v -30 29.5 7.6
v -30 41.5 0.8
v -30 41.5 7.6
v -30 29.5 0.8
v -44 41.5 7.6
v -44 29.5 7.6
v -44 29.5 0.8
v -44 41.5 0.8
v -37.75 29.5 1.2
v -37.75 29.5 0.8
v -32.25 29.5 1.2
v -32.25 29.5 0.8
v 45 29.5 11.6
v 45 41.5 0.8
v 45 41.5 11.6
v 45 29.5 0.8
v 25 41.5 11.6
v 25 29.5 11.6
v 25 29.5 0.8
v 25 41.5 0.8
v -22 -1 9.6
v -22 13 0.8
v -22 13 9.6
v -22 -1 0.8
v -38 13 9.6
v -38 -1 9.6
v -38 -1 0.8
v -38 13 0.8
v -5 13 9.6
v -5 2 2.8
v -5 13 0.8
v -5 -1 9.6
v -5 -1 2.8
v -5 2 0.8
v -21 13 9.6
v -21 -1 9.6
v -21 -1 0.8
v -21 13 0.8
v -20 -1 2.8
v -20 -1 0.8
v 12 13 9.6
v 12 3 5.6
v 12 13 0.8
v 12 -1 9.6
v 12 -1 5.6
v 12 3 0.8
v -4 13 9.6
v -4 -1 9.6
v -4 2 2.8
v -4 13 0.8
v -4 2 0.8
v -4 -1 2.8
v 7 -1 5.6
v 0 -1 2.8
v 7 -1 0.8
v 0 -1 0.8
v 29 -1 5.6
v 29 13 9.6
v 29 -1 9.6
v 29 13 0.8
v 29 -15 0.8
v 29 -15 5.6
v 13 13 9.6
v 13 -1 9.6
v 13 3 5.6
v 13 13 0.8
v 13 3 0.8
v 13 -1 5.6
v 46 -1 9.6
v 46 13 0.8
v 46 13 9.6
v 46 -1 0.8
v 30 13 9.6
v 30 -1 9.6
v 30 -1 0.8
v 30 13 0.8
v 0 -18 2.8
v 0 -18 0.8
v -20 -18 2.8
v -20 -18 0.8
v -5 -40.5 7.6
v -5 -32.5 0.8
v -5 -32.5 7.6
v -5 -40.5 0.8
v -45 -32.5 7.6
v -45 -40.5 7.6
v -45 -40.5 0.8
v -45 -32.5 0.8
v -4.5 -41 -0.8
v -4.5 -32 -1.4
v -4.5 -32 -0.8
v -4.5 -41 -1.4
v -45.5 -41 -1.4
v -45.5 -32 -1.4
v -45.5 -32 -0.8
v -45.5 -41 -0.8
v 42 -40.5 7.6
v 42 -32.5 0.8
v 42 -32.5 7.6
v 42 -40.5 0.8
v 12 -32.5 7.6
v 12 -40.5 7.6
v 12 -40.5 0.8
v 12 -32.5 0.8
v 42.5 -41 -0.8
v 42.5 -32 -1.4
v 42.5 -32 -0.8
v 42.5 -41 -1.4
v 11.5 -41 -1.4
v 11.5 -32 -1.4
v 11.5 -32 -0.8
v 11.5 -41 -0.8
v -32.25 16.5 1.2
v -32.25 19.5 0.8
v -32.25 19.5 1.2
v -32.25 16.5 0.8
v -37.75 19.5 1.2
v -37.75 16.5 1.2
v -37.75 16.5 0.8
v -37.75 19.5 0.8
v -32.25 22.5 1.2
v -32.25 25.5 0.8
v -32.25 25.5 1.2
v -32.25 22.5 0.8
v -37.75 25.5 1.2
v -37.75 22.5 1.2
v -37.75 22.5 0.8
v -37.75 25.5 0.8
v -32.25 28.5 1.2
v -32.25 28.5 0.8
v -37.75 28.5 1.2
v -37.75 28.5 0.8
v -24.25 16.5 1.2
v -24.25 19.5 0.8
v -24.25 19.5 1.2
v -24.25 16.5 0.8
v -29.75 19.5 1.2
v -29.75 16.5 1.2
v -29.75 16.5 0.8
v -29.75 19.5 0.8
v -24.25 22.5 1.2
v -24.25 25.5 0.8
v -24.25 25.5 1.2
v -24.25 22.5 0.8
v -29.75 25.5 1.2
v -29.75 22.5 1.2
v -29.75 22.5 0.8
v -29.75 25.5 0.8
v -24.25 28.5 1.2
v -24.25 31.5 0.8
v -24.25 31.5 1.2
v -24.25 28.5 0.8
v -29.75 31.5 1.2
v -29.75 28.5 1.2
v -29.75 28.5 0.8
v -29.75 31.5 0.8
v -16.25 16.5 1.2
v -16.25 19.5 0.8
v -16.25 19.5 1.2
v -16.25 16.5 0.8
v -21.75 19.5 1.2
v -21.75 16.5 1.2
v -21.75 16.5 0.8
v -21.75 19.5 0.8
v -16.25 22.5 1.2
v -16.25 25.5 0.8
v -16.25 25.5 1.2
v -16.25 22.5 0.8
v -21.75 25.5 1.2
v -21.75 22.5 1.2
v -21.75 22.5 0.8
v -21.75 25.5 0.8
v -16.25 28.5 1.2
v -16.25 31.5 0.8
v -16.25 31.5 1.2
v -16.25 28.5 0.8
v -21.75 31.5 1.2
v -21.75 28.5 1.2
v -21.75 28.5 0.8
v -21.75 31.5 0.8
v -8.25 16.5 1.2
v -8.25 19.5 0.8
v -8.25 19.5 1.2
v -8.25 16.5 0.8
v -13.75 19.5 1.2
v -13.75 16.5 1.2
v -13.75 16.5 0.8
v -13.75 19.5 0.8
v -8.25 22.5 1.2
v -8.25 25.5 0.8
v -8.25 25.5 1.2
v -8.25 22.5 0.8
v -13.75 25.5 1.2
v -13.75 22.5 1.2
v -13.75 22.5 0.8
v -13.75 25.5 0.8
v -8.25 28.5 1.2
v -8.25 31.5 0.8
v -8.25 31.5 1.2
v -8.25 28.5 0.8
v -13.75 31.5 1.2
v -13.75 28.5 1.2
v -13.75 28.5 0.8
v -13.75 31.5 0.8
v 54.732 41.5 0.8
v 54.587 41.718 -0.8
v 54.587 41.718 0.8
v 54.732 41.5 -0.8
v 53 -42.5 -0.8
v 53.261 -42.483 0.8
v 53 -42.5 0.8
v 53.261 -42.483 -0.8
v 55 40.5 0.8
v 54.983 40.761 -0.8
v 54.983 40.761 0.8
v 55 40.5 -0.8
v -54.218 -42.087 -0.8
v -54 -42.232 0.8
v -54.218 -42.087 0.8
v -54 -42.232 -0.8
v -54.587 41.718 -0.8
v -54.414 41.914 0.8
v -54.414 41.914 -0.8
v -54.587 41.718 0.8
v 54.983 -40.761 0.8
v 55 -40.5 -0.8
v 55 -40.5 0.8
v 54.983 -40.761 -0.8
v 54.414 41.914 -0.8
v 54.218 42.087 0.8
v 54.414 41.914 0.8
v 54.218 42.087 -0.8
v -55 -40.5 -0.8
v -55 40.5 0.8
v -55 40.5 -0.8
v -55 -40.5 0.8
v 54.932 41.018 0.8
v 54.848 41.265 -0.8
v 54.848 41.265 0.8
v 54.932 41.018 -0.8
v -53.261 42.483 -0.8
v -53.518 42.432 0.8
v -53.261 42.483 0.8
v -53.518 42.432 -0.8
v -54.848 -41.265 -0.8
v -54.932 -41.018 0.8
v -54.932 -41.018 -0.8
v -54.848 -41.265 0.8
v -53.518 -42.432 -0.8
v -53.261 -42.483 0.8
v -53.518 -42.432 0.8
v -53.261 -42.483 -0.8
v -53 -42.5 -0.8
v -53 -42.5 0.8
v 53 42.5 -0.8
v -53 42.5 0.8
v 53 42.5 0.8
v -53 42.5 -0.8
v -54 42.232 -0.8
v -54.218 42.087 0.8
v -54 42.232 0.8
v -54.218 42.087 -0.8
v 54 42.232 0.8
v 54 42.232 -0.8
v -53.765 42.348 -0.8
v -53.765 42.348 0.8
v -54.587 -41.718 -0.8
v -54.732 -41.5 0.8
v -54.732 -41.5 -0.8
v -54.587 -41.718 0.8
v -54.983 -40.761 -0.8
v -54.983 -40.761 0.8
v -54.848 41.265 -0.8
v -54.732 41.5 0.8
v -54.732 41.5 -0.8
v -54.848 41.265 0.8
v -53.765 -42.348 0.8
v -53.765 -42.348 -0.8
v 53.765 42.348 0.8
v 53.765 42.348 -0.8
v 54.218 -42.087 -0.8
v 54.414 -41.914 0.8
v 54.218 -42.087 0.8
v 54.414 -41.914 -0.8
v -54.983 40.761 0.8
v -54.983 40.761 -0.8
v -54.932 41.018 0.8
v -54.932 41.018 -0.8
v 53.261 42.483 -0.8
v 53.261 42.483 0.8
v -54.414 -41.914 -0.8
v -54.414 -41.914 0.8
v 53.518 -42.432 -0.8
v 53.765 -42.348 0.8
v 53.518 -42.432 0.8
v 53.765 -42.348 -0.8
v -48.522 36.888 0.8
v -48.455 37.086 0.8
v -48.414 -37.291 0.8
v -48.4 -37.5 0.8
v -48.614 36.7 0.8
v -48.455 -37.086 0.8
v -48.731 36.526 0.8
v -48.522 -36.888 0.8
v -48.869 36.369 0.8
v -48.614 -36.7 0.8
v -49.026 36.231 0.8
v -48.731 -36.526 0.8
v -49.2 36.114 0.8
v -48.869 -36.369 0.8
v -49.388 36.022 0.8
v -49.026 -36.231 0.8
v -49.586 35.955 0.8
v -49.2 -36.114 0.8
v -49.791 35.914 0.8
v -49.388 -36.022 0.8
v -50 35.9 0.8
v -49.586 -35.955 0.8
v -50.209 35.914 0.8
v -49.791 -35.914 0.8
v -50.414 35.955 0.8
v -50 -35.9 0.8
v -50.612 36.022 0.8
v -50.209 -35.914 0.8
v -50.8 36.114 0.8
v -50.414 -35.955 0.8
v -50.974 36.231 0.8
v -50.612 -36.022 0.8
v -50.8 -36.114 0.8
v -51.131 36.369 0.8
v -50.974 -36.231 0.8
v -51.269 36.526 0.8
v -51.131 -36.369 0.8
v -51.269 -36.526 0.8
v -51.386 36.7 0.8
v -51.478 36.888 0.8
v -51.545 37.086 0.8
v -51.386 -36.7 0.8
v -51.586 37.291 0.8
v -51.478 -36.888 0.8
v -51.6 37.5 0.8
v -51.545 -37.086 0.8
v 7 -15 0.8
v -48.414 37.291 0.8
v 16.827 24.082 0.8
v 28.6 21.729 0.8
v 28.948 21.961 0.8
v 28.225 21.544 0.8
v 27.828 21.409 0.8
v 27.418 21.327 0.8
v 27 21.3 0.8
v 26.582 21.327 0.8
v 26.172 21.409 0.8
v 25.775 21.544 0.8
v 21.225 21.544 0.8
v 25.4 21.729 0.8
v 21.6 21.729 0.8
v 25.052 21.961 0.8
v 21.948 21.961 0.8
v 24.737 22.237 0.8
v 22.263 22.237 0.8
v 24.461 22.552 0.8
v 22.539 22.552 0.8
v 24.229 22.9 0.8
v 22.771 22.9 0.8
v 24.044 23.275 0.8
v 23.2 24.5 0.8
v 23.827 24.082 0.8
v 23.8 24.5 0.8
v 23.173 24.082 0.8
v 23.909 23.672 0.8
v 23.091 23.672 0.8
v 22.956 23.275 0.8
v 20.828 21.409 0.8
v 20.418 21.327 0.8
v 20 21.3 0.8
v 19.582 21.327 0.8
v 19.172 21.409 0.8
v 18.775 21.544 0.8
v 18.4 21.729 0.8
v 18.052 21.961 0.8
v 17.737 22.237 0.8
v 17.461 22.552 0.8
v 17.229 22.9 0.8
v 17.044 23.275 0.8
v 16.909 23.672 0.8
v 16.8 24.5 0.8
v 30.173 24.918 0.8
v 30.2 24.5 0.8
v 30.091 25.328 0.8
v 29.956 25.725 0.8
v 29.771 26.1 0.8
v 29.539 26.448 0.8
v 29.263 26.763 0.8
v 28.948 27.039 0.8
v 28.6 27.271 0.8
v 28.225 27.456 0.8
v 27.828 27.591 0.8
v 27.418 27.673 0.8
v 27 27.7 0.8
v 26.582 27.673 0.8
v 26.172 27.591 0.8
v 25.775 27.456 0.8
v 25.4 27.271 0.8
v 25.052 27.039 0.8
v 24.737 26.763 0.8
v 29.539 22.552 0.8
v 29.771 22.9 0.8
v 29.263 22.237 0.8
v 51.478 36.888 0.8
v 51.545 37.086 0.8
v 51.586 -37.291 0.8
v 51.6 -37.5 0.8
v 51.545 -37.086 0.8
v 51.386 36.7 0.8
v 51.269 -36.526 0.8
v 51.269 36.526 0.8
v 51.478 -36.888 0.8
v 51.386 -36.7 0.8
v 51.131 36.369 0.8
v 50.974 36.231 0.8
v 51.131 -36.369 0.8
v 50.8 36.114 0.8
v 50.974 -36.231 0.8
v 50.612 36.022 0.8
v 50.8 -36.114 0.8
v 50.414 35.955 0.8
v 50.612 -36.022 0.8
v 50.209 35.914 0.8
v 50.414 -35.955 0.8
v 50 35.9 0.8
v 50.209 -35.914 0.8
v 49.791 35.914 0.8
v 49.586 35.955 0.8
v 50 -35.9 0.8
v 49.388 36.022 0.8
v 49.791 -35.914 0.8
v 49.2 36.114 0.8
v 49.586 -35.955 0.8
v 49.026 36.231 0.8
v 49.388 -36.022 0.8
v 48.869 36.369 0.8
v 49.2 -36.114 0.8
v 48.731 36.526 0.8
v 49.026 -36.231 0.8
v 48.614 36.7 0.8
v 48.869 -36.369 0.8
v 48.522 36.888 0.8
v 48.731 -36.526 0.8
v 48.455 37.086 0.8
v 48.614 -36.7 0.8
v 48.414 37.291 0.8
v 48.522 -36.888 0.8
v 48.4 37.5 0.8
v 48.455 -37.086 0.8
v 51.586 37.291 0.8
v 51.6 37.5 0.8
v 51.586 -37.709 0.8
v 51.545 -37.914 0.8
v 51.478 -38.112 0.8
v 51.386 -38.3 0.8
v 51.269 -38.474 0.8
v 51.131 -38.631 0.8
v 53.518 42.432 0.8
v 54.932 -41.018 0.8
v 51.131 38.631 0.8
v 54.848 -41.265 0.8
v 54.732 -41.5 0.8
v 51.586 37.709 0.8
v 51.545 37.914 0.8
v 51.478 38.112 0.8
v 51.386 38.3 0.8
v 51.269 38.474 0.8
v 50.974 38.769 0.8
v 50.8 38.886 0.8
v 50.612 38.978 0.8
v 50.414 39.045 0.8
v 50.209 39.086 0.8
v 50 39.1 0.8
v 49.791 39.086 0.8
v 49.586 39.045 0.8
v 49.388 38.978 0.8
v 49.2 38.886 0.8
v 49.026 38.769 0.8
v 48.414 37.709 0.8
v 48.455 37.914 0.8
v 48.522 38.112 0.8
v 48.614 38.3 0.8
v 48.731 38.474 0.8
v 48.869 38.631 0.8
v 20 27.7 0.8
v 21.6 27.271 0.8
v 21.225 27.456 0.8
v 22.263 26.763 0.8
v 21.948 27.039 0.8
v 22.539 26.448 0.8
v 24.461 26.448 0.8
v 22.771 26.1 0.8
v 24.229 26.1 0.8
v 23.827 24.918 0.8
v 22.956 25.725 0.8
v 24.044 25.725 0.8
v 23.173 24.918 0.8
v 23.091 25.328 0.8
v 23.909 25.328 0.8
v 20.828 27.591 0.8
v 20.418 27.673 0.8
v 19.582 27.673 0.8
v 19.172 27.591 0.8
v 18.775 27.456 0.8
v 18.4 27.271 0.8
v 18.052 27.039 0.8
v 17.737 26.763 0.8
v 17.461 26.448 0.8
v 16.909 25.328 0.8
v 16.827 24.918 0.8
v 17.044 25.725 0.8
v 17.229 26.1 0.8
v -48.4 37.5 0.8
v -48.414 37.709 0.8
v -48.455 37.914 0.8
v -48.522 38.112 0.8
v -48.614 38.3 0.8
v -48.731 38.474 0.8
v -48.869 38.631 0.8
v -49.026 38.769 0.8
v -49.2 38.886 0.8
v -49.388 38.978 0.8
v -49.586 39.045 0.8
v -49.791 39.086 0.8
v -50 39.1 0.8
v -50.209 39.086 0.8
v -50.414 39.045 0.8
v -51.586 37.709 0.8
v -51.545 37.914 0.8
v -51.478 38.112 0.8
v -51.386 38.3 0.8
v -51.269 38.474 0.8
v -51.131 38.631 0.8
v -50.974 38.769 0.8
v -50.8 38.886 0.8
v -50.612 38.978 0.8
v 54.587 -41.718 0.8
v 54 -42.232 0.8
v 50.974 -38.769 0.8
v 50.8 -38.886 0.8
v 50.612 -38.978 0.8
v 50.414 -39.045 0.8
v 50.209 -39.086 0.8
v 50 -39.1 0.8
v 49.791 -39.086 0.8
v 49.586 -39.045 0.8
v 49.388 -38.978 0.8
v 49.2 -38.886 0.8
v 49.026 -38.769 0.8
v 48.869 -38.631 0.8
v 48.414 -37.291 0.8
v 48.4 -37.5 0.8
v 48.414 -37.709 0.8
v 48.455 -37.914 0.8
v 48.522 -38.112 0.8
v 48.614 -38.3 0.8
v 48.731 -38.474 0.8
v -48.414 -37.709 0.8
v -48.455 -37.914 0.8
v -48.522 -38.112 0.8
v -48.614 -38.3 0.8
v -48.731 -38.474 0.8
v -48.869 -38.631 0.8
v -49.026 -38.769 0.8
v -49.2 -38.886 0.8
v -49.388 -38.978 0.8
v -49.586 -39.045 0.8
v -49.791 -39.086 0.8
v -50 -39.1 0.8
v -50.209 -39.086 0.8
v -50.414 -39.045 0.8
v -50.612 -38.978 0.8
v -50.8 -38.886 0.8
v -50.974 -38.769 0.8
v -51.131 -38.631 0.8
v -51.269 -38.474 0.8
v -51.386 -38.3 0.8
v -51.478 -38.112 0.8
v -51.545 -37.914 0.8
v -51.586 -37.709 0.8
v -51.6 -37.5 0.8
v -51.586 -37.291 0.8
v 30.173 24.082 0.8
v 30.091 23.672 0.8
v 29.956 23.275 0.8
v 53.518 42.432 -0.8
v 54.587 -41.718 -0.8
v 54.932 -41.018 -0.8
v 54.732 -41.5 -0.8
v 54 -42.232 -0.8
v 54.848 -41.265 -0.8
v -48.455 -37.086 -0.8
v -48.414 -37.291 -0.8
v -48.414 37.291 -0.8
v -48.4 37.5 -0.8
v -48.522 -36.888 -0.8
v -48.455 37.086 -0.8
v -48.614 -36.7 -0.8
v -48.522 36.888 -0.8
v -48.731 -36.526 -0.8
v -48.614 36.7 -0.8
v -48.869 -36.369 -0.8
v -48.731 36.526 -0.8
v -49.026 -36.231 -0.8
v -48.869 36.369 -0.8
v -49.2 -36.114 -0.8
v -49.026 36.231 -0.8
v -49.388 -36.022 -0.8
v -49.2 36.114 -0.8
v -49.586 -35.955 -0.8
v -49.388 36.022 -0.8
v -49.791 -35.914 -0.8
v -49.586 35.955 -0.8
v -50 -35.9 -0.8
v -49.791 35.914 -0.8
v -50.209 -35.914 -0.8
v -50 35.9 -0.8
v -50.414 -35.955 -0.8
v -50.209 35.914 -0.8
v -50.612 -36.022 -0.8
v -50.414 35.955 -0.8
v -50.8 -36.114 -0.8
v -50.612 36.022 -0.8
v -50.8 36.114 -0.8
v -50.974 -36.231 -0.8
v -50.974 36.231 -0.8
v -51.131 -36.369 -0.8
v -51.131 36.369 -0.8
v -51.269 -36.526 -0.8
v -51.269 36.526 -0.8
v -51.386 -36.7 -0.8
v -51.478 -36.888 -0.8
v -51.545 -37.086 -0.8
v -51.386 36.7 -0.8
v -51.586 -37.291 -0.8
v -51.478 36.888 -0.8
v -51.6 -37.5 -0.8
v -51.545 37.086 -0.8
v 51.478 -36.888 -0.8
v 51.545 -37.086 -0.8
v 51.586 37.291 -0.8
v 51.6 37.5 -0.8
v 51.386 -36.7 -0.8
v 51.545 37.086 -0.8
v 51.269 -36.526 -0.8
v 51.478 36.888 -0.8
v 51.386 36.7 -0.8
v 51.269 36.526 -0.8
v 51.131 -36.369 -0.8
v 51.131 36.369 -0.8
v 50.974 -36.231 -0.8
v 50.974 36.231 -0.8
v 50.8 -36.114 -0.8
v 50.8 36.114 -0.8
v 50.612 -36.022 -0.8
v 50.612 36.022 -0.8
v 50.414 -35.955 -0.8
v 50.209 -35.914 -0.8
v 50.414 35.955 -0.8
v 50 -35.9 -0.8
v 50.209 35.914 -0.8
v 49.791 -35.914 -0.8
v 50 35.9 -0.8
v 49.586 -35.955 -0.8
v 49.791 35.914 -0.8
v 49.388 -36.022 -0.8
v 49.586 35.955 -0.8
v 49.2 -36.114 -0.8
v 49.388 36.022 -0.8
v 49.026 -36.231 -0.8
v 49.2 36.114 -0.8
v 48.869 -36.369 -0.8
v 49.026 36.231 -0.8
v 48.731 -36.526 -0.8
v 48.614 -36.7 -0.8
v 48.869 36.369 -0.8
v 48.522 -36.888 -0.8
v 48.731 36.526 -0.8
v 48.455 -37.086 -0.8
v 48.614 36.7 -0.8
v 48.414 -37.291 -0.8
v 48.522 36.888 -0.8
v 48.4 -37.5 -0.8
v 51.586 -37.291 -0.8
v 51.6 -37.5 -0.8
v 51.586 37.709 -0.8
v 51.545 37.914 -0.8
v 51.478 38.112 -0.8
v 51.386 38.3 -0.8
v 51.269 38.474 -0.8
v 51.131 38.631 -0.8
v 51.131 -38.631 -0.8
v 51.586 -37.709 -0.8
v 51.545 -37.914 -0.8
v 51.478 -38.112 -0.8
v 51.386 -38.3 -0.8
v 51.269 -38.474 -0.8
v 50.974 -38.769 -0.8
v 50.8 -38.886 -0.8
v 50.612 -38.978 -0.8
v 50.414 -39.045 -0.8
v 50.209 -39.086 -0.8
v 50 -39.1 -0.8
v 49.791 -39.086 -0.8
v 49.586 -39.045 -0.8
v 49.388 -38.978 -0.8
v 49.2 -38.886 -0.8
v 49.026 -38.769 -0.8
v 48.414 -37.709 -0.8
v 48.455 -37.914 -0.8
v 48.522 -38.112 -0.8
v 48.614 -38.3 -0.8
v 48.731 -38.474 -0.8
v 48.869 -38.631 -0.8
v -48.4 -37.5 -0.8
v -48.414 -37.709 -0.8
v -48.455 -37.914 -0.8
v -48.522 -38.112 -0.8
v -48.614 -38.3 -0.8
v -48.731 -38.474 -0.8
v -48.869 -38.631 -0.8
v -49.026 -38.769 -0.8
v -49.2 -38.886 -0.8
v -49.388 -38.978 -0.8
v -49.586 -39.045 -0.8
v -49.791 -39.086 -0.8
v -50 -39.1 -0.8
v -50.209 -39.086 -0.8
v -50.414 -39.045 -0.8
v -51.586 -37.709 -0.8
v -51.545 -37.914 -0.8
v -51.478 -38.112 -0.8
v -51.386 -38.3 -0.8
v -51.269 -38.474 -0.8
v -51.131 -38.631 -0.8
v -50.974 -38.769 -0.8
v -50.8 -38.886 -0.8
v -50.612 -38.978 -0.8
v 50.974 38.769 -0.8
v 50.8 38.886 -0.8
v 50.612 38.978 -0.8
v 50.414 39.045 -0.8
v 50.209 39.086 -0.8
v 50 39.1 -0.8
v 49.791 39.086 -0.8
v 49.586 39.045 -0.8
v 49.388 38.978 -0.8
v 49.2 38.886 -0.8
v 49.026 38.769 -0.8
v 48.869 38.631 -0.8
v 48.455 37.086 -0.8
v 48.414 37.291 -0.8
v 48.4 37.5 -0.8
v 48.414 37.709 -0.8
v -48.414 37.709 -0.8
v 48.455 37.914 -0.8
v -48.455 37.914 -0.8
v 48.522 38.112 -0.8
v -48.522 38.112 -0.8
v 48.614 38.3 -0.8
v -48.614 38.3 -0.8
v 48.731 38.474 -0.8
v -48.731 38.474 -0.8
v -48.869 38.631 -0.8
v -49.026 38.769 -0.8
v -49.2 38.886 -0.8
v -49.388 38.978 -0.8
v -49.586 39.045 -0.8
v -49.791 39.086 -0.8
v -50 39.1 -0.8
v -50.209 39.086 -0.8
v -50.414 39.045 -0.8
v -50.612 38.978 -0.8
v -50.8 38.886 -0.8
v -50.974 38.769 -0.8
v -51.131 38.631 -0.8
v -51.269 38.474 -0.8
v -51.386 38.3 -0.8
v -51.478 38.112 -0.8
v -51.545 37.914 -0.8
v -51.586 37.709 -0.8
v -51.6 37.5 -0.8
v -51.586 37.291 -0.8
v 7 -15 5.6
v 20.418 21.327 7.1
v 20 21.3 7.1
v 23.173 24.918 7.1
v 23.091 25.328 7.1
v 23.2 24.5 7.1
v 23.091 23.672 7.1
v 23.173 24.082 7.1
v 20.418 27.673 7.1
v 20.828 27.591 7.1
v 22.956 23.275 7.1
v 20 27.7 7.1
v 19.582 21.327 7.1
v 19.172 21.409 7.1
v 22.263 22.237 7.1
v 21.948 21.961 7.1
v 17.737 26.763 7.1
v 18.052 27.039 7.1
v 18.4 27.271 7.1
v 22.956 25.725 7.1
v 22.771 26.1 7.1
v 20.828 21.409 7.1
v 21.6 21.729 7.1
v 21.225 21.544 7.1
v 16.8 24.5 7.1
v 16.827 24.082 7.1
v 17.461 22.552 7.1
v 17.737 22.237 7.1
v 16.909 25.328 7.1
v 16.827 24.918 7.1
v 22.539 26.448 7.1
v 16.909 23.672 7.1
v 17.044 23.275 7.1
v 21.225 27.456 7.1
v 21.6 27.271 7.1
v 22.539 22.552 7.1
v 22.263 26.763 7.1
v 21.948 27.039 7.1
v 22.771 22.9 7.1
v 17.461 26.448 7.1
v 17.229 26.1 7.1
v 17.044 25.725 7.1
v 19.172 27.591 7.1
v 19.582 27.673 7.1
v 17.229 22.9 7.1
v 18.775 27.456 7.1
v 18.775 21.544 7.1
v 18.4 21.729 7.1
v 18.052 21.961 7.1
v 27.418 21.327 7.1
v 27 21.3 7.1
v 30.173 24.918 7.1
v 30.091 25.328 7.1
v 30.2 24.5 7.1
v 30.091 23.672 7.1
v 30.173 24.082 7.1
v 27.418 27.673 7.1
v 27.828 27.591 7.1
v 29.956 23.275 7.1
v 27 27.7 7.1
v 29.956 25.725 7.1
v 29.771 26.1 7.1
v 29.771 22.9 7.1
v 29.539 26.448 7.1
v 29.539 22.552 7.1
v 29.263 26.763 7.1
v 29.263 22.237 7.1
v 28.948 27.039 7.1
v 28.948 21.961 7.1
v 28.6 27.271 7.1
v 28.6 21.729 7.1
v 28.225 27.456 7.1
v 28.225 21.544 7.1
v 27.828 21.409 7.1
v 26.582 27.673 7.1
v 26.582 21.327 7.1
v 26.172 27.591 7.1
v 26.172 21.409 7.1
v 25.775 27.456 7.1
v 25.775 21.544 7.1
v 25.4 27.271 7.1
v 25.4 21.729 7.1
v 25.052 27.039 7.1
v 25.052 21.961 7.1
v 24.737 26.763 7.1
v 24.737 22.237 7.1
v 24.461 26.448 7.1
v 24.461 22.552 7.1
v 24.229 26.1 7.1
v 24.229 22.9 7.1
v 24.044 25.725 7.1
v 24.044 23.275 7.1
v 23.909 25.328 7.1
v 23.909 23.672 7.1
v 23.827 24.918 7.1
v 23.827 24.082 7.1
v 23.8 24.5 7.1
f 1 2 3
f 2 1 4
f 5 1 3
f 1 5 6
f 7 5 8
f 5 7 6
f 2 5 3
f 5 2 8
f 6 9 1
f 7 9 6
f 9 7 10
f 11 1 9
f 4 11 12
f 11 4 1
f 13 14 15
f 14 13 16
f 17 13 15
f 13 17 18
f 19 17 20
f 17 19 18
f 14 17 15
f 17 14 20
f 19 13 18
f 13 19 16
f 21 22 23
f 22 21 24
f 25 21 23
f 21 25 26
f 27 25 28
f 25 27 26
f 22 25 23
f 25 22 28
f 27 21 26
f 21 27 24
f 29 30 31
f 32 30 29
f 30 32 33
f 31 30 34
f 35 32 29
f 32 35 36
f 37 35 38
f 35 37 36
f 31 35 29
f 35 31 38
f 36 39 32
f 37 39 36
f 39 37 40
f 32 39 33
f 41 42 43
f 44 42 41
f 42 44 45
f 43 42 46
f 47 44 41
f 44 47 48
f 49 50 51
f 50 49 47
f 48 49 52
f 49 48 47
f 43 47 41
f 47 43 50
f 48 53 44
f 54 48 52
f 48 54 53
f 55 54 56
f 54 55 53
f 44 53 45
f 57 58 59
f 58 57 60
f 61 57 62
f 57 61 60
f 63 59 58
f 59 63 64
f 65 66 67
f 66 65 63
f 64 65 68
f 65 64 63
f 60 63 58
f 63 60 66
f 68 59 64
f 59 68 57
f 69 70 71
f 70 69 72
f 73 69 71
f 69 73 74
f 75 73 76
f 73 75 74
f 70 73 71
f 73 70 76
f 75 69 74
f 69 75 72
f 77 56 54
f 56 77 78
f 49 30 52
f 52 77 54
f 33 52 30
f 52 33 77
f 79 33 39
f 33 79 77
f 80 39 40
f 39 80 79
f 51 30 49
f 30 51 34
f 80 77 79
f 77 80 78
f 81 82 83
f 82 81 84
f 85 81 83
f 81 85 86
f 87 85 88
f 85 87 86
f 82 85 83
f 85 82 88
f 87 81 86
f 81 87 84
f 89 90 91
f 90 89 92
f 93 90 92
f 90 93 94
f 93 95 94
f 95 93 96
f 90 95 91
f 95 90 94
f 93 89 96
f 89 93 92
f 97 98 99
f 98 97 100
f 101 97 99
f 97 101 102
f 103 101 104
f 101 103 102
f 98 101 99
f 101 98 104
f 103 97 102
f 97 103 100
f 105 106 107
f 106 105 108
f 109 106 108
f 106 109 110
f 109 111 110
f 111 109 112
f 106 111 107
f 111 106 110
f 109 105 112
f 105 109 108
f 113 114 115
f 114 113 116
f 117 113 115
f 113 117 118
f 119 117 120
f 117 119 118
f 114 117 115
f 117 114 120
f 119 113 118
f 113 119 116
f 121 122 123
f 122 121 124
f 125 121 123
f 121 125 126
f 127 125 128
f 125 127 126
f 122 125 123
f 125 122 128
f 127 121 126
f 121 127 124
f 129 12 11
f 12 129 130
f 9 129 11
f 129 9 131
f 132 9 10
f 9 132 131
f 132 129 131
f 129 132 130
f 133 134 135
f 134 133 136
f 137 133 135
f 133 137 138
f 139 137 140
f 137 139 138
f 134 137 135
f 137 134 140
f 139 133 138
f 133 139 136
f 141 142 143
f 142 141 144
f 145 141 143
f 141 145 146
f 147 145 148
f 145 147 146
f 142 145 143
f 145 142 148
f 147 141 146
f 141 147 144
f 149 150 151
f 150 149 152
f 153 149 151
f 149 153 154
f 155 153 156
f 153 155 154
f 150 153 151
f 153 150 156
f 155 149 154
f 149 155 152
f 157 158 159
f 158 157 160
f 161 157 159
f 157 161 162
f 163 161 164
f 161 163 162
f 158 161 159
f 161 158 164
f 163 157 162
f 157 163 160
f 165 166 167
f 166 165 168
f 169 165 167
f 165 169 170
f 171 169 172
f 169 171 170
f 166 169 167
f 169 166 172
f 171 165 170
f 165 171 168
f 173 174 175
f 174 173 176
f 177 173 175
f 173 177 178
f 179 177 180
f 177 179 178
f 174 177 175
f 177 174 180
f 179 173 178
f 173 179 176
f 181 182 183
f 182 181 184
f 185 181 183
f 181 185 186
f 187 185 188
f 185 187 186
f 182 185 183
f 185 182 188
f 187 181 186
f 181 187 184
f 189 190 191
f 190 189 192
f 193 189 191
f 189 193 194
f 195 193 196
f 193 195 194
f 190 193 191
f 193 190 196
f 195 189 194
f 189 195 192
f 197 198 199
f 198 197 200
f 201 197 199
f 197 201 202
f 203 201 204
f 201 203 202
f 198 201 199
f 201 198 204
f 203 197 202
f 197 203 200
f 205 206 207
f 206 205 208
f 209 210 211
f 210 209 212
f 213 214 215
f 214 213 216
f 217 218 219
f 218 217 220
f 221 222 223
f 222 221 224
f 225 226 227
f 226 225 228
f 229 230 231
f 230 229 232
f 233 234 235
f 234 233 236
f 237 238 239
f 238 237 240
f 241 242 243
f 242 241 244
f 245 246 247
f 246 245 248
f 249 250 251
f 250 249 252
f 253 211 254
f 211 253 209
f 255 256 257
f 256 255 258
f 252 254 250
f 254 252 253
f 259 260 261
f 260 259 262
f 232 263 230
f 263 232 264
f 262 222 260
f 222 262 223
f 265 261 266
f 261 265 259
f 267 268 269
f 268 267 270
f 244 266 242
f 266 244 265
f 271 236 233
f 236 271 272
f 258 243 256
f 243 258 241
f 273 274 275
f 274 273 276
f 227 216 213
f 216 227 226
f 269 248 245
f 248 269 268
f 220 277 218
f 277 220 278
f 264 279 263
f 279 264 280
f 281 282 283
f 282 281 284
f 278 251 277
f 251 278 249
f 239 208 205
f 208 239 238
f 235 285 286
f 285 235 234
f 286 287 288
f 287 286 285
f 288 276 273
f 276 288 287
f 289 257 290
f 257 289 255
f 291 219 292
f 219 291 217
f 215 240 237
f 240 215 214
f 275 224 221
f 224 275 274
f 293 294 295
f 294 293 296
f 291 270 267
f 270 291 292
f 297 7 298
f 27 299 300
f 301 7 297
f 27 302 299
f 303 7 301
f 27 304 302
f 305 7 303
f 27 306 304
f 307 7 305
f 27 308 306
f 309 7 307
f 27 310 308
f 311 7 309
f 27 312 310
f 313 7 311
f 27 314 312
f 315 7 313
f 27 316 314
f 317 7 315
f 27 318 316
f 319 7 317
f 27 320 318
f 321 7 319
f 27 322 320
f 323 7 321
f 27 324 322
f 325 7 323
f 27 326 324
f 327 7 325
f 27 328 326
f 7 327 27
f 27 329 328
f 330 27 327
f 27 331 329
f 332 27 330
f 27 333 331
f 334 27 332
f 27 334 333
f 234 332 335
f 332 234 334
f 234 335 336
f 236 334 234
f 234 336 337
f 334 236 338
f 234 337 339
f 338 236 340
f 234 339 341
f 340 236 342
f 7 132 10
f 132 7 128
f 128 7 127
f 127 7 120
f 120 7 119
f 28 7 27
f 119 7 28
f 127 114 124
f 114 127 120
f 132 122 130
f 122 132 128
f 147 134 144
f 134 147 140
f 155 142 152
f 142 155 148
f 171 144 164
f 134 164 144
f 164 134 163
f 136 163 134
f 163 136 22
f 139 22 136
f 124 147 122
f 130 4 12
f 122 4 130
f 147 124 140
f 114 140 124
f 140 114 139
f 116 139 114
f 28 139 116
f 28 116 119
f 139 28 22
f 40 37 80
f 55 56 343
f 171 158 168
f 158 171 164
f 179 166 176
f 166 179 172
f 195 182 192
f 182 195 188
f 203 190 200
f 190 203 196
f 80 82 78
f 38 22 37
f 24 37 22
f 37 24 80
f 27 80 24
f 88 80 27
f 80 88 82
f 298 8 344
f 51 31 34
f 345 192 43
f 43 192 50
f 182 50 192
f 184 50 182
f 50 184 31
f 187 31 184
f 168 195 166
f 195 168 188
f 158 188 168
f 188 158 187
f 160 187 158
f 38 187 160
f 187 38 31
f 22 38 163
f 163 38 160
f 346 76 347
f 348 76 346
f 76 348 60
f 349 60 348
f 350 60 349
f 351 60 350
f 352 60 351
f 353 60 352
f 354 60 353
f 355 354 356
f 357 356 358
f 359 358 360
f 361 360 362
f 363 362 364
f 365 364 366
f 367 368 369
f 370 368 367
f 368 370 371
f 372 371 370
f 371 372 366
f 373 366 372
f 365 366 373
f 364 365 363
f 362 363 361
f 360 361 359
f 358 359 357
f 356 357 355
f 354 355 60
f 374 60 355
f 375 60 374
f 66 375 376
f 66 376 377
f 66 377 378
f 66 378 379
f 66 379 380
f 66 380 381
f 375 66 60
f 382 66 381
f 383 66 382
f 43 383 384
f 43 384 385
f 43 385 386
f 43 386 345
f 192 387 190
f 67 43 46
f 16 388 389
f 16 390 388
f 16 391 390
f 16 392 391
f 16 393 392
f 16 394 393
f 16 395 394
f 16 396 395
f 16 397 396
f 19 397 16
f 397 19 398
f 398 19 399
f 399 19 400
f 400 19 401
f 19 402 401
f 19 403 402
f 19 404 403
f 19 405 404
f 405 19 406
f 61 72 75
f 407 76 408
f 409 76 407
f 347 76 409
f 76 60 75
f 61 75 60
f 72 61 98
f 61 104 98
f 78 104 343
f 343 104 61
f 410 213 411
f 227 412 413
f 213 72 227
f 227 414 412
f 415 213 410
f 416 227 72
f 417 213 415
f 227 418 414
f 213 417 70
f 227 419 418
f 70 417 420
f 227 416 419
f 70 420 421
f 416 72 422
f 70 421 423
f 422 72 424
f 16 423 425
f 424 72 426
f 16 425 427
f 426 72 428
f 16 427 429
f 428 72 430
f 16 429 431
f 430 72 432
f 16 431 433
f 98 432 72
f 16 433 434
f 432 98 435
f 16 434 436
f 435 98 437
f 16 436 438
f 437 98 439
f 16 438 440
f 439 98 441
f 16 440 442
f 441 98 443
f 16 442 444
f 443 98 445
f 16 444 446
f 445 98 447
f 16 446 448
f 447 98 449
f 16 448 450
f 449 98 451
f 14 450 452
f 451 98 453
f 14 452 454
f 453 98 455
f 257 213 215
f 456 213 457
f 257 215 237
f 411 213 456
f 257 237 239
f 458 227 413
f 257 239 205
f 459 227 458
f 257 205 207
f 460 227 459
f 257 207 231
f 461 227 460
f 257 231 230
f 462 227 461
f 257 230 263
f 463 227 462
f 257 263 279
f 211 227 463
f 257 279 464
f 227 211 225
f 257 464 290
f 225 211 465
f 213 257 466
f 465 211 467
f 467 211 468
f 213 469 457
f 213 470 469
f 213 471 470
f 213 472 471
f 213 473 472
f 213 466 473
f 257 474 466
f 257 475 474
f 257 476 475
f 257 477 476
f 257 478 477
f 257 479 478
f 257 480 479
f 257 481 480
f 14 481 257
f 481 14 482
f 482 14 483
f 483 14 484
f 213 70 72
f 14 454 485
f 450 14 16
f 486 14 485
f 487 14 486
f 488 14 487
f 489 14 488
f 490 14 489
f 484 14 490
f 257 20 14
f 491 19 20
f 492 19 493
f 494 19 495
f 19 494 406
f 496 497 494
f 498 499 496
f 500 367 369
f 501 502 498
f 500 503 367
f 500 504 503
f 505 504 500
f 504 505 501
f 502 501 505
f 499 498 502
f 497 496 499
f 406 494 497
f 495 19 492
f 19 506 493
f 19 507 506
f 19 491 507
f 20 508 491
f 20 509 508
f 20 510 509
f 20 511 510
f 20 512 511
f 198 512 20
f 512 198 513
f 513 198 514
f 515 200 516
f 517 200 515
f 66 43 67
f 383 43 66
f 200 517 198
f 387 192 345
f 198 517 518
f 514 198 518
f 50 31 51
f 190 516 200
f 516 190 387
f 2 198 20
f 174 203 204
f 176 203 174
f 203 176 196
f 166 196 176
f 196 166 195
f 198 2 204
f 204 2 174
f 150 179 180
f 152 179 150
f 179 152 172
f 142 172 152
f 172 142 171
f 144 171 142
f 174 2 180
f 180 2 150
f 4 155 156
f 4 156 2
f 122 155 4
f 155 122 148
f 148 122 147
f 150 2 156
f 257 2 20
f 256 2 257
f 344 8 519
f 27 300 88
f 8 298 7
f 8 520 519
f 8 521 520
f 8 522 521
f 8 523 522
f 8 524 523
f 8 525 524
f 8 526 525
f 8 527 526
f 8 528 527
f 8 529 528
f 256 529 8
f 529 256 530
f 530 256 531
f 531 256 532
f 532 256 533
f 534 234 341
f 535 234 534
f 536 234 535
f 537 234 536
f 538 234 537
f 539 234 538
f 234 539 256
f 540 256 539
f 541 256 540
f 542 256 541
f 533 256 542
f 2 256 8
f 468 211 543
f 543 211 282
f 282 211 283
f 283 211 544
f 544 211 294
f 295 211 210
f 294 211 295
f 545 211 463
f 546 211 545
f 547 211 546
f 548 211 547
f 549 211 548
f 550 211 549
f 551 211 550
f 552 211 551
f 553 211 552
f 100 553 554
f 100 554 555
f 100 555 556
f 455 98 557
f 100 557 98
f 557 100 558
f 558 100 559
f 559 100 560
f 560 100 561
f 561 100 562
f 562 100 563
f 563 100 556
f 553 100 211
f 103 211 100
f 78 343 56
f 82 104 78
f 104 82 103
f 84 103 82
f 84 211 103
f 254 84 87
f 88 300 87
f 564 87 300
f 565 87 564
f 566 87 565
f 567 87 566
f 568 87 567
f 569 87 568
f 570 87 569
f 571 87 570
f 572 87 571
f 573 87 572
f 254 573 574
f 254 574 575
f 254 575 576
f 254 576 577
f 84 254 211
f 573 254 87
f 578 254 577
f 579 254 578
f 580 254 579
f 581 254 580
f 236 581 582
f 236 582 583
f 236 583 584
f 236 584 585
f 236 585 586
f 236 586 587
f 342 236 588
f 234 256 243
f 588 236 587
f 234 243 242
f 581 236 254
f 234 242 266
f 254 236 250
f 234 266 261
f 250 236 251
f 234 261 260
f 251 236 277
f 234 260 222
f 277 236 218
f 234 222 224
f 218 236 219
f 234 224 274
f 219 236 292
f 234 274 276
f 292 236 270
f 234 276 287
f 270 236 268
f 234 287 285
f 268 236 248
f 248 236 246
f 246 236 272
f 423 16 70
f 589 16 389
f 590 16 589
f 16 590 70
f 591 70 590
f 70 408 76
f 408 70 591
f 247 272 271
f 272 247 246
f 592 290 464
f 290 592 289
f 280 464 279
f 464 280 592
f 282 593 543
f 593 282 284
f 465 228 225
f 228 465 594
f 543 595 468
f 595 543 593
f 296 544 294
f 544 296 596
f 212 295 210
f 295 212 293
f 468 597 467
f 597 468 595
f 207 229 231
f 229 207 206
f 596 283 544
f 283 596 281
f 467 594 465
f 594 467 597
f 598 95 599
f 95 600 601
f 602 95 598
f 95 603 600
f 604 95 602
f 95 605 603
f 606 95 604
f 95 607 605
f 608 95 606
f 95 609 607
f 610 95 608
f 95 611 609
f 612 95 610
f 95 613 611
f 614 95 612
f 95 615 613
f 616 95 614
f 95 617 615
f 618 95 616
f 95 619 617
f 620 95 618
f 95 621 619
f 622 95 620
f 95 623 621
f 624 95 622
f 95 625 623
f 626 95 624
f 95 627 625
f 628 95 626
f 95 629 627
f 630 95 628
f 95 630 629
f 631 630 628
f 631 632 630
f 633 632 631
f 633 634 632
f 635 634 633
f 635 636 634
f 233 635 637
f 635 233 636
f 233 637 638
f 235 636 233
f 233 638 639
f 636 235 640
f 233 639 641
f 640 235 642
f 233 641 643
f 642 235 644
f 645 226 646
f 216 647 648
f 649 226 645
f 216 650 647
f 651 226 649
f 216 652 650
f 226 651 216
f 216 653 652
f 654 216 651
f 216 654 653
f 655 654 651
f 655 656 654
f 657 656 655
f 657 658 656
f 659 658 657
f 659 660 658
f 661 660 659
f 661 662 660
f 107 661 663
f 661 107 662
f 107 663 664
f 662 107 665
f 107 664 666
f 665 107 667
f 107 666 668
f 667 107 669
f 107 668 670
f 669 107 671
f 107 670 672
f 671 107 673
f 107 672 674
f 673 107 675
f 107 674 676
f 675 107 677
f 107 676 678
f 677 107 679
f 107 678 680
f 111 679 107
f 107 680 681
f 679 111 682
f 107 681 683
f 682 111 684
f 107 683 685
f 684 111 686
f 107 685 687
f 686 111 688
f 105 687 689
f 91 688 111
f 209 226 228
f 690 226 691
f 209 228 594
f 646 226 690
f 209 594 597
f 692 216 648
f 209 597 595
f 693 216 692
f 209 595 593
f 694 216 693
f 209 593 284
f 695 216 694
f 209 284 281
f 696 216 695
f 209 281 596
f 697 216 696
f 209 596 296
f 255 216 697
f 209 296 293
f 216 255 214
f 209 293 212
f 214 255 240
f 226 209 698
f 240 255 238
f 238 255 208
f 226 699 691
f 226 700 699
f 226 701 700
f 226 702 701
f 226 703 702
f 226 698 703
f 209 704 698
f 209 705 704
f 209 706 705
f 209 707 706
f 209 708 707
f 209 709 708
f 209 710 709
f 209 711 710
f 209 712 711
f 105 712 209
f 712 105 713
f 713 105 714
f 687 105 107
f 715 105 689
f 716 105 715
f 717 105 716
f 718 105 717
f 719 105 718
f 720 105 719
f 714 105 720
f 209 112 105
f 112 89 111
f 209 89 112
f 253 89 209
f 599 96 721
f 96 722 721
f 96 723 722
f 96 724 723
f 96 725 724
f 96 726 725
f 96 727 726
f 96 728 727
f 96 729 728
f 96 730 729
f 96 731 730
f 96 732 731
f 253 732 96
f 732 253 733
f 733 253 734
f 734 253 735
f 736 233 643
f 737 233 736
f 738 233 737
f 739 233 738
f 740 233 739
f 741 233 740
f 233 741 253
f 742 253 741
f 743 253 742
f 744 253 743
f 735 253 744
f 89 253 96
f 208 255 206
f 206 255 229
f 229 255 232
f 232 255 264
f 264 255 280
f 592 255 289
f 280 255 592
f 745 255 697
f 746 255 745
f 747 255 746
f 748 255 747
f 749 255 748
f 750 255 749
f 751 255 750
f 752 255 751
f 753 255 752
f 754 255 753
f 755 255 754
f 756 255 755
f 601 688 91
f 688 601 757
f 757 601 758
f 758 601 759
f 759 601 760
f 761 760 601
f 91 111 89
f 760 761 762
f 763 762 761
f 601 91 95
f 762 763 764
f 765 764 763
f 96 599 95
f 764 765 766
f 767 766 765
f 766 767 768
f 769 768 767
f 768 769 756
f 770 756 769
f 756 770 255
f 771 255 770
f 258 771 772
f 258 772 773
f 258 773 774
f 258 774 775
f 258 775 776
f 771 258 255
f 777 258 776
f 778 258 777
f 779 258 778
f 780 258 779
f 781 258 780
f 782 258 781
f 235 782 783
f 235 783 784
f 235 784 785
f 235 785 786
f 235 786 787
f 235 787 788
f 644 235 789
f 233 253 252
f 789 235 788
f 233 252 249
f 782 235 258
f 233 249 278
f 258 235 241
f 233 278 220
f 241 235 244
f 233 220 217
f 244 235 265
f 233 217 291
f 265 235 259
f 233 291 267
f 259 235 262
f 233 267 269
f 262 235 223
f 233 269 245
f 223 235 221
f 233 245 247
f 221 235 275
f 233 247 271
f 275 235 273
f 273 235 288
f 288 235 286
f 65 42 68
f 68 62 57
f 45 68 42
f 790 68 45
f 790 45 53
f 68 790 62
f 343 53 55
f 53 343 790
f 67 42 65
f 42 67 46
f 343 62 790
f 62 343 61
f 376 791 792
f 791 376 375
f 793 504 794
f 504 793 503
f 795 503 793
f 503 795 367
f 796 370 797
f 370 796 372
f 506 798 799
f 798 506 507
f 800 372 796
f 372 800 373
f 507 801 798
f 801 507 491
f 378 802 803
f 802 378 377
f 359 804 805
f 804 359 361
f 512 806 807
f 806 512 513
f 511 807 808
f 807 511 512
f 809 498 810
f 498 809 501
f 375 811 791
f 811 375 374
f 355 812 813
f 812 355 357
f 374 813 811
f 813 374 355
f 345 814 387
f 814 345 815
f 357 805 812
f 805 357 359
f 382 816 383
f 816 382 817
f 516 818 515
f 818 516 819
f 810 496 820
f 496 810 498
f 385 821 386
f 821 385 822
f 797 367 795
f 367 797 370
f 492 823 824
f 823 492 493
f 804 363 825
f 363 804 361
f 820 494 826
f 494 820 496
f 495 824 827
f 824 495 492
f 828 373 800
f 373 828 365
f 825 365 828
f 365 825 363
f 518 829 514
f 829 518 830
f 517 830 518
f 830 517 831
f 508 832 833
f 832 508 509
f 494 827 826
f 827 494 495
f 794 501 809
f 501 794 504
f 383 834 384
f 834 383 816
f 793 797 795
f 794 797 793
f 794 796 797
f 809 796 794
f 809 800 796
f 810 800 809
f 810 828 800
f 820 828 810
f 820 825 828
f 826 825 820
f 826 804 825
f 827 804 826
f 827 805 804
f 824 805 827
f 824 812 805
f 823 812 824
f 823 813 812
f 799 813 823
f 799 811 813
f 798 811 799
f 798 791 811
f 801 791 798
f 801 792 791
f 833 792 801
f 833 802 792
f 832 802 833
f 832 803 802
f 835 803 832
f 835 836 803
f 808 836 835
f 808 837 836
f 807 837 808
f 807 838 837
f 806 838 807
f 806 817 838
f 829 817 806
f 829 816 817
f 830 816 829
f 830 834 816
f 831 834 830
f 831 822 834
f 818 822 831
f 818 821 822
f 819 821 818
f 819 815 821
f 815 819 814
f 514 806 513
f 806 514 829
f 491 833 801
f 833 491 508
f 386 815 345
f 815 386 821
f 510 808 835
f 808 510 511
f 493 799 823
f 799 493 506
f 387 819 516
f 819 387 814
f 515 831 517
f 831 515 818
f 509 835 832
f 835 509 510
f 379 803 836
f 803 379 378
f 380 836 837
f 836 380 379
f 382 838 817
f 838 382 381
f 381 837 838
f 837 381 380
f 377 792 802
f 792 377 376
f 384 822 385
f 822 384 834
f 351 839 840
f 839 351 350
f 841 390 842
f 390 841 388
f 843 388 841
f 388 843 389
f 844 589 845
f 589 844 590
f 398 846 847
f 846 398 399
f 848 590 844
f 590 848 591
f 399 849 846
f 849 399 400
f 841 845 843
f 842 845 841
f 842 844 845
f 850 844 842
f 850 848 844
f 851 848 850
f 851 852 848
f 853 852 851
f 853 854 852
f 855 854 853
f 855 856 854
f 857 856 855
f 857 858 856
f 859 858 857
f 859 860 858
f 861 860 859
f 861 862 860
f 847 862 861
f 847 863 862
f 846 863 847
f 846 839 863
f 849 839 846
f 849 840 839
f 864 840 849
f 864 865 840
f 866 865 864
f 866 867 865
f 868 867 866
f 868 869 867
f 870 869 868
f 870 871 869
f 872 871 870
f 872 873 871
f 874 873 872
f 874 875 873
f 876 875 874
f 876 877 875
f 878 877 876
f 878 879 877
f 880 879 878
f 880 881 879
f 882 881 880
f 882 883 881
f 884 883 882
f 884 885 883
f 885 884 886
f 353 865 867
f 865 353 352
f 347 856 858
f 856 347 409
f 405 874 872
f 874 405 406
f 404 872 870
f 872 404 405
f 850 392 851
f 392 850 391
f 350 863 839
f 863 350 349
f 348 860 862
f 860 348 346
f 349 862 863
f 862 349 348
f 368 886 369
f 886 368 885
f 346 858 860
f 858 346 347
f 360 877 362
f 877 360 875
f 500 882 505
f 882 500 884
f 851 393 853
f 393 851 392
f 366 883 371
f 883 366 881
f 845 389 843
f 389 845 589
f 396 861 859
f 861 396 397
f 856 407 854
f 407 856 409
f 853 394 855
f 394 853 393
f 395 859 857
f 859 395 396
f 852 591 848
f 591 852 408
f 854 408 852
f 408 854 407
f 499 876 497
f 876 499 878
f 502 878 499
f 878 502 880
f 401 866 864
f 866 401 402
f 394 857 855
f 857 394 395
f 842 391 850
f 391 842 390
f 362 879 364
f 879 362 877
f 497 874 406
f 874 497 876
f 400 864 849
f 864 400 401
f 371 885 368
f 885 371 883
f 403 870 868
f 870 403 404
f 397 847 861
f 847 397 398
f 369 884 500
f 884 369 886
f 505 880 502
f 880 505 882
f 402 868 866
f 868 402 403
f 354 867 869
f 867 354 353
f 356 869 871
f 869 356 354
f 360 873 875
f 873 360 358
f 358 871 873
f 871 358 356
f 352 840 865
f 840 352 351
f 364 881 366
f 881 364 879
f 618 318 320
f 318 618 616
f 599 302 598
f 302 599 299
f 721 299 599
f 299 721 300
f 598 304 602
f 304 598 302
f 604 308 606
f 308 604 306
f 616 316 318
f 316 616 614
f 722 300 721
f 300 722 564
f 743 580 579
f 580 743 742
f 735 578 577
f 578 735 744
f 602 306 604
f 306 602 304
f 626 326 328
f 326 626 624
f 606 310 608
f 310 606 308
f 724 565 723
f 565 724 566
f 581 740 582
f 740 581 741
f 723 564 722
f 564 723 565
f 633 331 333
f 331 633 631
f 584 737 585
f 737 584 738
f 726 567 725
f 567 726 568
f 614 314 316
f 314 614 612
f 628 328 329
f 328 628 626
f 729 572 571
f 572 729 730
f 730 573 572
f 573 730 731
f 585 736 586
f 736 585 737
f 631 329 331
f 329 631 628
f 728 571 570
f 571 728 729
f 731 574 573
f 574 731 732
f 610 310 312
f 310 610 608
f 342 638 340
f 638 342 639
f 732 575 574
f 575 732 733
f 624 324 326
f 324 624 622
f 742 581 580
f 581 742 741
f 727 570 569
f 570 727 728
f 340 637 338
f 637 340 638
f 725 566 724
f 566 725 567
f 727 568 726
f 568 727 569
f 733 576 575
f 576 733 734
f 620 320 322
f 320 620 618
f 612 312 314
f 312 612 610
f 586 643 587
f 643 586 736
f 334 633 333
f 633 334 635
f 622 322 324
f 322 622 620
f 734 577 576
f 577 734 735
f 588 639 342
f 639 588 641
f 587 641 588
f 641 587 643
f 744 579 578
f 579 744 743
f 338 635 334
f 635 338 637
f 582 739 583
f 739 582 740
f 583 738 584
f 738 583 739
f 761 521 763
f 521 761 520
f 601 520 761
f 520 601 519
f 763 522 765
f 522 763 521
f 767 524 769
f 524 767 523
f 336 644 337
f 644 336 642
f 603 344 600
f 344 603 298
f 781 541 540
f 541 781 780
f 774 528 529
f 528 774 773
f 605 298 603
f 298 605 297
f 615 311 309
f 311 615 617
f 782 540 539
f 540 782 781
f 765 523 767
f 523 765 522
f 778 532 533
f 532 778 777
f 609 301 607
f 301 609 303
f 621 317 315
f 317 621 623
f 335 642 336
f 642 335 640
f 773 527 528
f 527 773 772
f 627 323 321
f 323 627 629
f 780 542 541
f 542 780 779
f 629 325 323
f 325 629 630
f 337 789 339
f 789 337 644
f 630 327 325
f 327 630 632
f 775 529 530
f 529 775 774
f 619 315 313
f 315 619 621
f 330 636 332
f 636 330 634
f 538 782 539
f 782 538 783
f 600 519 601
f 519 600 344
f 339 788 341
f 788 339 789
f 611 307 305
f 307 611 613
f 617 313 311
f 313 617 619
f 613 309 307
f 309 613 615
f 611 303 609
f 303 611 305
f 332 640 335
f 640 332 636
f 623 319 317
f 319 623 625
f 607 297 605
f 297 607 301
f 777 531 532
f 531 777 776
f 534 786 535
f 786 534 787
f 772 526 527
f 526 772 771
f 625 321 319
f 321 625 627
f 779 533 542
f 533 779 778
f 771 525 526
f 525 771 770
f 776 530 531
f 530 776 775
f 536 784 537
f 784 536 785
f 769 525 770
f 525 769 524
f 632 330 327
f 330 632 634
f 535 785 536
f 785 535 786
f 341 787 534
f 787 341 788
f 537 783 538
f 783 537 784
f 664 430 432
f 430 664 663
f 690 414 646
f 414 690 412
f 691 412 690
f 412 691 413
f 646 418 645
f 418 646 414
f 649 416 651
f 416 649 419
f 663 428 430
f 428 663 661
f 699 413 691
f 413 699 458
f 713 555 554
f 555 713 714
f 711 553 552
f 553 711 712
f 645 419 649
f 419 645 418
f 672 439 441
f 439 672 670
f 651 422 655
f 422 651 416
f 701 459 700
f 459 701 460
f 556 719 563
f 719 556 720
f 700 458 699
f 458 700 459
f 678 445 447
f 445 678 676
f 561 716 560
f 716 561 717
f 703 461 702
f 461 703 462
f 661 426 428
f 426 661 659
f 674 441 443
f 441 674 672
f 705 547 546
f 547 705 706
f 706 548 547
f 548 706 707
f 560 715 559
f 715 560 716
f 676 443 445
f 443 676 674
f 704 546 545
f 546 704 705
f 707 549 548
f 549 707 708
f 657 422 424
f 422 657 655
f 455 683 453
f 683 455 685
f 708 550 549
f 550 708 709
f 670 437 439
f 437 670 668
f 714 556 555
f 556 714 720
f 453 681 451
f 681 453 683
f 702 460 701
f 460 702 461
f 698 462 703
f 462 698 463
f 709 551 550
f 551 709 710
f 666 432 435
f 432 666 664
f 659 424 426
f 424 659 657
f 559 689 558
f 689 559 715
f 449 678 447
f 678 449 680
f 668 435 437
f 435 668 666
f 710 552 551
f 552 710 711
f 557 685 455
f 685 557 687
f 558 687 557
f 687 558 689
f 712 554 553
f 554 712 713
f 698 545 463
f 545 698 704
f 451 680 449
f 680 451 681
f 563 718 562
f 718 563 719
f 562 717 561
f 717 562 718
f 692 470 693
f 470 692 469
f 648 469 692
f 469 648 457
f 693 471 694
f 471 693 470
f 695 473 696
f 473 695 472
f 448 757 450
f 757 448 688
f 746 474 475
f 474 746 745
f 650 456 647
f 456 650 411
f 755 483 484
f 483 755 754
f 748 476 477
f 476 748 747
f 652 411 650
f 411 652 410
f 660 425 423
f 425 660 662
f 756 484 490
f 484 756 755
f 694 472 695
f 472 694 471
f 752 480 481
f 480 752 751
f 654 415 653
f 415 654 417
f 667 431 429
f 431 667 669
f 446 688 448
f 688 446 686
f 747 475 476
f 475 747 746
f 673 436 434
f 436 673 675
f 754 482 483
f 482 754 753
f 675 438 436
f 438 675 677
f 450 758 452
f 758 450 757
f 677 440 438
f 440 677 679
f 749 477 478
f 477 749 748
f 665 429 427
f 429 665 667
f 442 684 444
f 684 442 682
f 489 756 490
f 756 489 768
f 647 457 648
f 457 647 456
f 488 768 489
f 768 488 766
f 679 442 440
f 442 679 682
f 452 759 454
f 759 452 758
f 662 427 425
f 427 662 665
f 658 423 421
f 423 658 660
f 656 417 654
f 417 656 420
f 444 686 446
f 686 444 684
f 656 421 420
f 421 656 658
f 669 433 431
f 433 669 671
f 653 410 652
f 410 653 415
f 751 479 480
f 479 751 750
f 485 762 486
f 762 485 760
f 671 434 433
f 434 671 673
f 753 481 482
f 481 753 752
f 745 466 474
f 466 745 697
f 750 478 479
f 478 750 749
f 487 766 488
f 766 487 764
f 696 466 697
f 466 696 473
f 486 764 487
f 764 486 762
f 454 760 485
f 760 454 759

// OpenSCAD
// 3D printer mainboard (generic) - 110.0mm x 85.0mm x 1.6mm
// FIXED: ensure ALL components physically intersect the PCB (no floating parts)
// - All solids are in a single union() (with holes subtracted after)
// - Components overlap into PCB by 1.2mm to guarantee attachment

$fn = 48;

// Parameters
length_mm    = 110.0;  // X
width_mm     = 85.0;   // Y
thickness_mm = 1.6;    // Z (PCB)

// Small overlap to guarantee watertight unions / attachments
eps = 0.2;
attach_overlap = 1.2;   // 1–2mm required overlap into PCB

// ---------- Helpers ----------
module rounded_rect_prism(size=[10,10,2], r=1, center=true) {
    x = size[0]; y = size[1]; z = size[2];
    translate(center ? [0,0,0] : [x/2,y/2,z/2])
        linear_extrude(height=z, center=true)
            offset(r=r)
                square([x-2*r, y-2*r], center=true);
}

module pin_header_block(x=10, y=6, z=8, base=1.2) {
    union() {
        cube([x, y, z], center=true);
        translate([0, 0, -z/2 - base/2 + eps])
            cube([x+1.0, y+1.0, base], center=true);
    }
}

module usb_block(x=14, y=12, z=8) {
    union() {
        cube([x, y, z], center=true);
        translate([0, 0, z/2 - 1.2])
            cube([x-2.0, y-2.0, 2.4], center=true);
    }
}

module terminal_block(x=18, y=12, z=12) {
    union() {
        cube([x, y, z], center=true);
        translate([0, 0, z/2 - 2.0])
            cube([x-2.0, y-2.0, 4.0], center=true);
    }
}

module stepper_socket(x=16, y=14, z=10) {
    union() {
        cube([x, y, z], center=true);
        translate([0, 0, z/2 - 1.5])
            cube([x-2.0, y-2.0, 3.0], center=true);
    }
}

module chip_qfp(x=18, y=18, z=3) {
    union() {
        cube([x, y, z], center=true);
        translate([0, 0, z/2 - 0.6])
            cube([x-3.0, y-3.0, 1.2], center=true);
    }
}

module capacitor_cyl(r=3.2, h=7.5) {
    cylinder(r=r, h=h, center=true);
}

// ---------- Mainboard ----------
module mainboard_110x85x1p6() {
    L = length_mm;
    W = width_mm;
    T = thickness_mm;

    // Mounting holes
    hole_d = 3.2;
    hole_r = hole_d/2;
    inset_x = 5.0;
    inset_y = 5.0;

    pcb_top_z = T/2;

    // Place components so their bottoms penetrate into PCB by attach_overlap
    // For a component of height h (centered), bottom is at (z - h/2).
    // We want bottom = pcb_top_z - attach_overlap  => z = pcb_top_z + h/2 - attach_overlap
    function comp_center_z(h) = pcb_top_z + h/2 - attach_overlap;

    difference() {
        union() {
            // PCB slab
            color([0.0, 0.4, 0.2])
                rounded_rect_prism([L, W, T], r=2.0, center=true);

            // --- Major connectors along one long edge (Y = +W/2) ---
            usb_h = 8;
            translate([
                -L/2 + 18,
                W/2 - 7,
                comp_center_z(usb_h)
            ])
                color([0.75, 0.75, 0.78]) usb_block(x=14, y=12, z=usb_h);

            term_h = 12;
            translate([
                L/2 - 20,
                W/2 - 7,
                comp_center_z(term_h)
            ])
                color([0.1, 0.55, 0.1]) terminal_block(x=20, y=12, z=term_h);

            // --- Stepper driver sockets (row) ---
            sock_h = 10;
            sock_y = 6;
            for (i = [0:4]) {
                x_pos = -L/2 + 25 + i*17;
                translate([x_pos, sock_y, comp_center_z(sock_h)])
                    color([0.15, 0.15, 0.15]) stepper_socket(x=16, y=14, z=sock_h);
            }

            // --- MCU / main chip near center-left ---
            mcu_h = 3.2;
            translate([-10, -8, comp_center_z(mcu_h)])
                color([0.12, 0.12, 0.12]) chip_qfp(x=20, y=20, z=mcu_h);

            // --- Heatsink-like block near center-right ---
            hs_h = 6;
            translate([18, -6, comp_center_z(hs_h)])
                color([0.25, 0.25, 0.25]) cube([22, 18, hs_h], center=true);

            // --- Capacitors near power input ---
            cap_h = 7.5;
            translate([L/2 - 35, W/2 - 18, comp_center_z(cap_h)])
                color([0.08, 0.08, 0.08]) capacitor_cyl(r=3.2, h=cap_h);
            translate([L/2 - 28, W/2 - 18, comp_center_z(cap_h)])
                color([0.08, 0.08, 0.08]) capacitor_cyl(r=3.2, h=cap_h);

            // --- Pin headers along bottom edge (Y = -W/2) ---
            hdr_h = 8;
            translate([-L/2 + 30, -W/2 + 6, comp_center_z(hdr_h)])
                color([0.1, 0.1, 0.1]) pin_header_block(x=40, y=8, z=hdr_h, base=1.2);

            translate([L/2 - 28, -W/2 + 6, comp_center_z(hdr_h)])
                color([0.1, 0.1, 0.1]) pin_header_block(x=30, y=8, z=hdr_h, base=1.2);

            // --- Small components cluster (low-profile) ---
            // Ensure these also overlap into PCB (previously could appear offset)
            smd_h = 1.6;
            for (ix = [0:3])
                for (iy = [0:2]) {
                    translate([
                        -35 + ix*8,
                        18 + iy*6,
                        comp_center_z(smd_h)
                    ])
                        color([0.2, 0.2, 0.2]) cube([5.5, 3.0, smd_h], center=true);
                }
        }

        // Mounting holes (through PCB only)
        for (sx = [-1, 1])
            for (sy = [-1, 1]) {
                translate([
                    sx*(L/2 - inset_x),
                    sy*(W/2 - inset_y),
                    0
                ])
                    cylinder(r=hole_r, h=T + 2*eps, center=true);
            }
    }
}

// Assembly
mainboard_110x85x1p6();
